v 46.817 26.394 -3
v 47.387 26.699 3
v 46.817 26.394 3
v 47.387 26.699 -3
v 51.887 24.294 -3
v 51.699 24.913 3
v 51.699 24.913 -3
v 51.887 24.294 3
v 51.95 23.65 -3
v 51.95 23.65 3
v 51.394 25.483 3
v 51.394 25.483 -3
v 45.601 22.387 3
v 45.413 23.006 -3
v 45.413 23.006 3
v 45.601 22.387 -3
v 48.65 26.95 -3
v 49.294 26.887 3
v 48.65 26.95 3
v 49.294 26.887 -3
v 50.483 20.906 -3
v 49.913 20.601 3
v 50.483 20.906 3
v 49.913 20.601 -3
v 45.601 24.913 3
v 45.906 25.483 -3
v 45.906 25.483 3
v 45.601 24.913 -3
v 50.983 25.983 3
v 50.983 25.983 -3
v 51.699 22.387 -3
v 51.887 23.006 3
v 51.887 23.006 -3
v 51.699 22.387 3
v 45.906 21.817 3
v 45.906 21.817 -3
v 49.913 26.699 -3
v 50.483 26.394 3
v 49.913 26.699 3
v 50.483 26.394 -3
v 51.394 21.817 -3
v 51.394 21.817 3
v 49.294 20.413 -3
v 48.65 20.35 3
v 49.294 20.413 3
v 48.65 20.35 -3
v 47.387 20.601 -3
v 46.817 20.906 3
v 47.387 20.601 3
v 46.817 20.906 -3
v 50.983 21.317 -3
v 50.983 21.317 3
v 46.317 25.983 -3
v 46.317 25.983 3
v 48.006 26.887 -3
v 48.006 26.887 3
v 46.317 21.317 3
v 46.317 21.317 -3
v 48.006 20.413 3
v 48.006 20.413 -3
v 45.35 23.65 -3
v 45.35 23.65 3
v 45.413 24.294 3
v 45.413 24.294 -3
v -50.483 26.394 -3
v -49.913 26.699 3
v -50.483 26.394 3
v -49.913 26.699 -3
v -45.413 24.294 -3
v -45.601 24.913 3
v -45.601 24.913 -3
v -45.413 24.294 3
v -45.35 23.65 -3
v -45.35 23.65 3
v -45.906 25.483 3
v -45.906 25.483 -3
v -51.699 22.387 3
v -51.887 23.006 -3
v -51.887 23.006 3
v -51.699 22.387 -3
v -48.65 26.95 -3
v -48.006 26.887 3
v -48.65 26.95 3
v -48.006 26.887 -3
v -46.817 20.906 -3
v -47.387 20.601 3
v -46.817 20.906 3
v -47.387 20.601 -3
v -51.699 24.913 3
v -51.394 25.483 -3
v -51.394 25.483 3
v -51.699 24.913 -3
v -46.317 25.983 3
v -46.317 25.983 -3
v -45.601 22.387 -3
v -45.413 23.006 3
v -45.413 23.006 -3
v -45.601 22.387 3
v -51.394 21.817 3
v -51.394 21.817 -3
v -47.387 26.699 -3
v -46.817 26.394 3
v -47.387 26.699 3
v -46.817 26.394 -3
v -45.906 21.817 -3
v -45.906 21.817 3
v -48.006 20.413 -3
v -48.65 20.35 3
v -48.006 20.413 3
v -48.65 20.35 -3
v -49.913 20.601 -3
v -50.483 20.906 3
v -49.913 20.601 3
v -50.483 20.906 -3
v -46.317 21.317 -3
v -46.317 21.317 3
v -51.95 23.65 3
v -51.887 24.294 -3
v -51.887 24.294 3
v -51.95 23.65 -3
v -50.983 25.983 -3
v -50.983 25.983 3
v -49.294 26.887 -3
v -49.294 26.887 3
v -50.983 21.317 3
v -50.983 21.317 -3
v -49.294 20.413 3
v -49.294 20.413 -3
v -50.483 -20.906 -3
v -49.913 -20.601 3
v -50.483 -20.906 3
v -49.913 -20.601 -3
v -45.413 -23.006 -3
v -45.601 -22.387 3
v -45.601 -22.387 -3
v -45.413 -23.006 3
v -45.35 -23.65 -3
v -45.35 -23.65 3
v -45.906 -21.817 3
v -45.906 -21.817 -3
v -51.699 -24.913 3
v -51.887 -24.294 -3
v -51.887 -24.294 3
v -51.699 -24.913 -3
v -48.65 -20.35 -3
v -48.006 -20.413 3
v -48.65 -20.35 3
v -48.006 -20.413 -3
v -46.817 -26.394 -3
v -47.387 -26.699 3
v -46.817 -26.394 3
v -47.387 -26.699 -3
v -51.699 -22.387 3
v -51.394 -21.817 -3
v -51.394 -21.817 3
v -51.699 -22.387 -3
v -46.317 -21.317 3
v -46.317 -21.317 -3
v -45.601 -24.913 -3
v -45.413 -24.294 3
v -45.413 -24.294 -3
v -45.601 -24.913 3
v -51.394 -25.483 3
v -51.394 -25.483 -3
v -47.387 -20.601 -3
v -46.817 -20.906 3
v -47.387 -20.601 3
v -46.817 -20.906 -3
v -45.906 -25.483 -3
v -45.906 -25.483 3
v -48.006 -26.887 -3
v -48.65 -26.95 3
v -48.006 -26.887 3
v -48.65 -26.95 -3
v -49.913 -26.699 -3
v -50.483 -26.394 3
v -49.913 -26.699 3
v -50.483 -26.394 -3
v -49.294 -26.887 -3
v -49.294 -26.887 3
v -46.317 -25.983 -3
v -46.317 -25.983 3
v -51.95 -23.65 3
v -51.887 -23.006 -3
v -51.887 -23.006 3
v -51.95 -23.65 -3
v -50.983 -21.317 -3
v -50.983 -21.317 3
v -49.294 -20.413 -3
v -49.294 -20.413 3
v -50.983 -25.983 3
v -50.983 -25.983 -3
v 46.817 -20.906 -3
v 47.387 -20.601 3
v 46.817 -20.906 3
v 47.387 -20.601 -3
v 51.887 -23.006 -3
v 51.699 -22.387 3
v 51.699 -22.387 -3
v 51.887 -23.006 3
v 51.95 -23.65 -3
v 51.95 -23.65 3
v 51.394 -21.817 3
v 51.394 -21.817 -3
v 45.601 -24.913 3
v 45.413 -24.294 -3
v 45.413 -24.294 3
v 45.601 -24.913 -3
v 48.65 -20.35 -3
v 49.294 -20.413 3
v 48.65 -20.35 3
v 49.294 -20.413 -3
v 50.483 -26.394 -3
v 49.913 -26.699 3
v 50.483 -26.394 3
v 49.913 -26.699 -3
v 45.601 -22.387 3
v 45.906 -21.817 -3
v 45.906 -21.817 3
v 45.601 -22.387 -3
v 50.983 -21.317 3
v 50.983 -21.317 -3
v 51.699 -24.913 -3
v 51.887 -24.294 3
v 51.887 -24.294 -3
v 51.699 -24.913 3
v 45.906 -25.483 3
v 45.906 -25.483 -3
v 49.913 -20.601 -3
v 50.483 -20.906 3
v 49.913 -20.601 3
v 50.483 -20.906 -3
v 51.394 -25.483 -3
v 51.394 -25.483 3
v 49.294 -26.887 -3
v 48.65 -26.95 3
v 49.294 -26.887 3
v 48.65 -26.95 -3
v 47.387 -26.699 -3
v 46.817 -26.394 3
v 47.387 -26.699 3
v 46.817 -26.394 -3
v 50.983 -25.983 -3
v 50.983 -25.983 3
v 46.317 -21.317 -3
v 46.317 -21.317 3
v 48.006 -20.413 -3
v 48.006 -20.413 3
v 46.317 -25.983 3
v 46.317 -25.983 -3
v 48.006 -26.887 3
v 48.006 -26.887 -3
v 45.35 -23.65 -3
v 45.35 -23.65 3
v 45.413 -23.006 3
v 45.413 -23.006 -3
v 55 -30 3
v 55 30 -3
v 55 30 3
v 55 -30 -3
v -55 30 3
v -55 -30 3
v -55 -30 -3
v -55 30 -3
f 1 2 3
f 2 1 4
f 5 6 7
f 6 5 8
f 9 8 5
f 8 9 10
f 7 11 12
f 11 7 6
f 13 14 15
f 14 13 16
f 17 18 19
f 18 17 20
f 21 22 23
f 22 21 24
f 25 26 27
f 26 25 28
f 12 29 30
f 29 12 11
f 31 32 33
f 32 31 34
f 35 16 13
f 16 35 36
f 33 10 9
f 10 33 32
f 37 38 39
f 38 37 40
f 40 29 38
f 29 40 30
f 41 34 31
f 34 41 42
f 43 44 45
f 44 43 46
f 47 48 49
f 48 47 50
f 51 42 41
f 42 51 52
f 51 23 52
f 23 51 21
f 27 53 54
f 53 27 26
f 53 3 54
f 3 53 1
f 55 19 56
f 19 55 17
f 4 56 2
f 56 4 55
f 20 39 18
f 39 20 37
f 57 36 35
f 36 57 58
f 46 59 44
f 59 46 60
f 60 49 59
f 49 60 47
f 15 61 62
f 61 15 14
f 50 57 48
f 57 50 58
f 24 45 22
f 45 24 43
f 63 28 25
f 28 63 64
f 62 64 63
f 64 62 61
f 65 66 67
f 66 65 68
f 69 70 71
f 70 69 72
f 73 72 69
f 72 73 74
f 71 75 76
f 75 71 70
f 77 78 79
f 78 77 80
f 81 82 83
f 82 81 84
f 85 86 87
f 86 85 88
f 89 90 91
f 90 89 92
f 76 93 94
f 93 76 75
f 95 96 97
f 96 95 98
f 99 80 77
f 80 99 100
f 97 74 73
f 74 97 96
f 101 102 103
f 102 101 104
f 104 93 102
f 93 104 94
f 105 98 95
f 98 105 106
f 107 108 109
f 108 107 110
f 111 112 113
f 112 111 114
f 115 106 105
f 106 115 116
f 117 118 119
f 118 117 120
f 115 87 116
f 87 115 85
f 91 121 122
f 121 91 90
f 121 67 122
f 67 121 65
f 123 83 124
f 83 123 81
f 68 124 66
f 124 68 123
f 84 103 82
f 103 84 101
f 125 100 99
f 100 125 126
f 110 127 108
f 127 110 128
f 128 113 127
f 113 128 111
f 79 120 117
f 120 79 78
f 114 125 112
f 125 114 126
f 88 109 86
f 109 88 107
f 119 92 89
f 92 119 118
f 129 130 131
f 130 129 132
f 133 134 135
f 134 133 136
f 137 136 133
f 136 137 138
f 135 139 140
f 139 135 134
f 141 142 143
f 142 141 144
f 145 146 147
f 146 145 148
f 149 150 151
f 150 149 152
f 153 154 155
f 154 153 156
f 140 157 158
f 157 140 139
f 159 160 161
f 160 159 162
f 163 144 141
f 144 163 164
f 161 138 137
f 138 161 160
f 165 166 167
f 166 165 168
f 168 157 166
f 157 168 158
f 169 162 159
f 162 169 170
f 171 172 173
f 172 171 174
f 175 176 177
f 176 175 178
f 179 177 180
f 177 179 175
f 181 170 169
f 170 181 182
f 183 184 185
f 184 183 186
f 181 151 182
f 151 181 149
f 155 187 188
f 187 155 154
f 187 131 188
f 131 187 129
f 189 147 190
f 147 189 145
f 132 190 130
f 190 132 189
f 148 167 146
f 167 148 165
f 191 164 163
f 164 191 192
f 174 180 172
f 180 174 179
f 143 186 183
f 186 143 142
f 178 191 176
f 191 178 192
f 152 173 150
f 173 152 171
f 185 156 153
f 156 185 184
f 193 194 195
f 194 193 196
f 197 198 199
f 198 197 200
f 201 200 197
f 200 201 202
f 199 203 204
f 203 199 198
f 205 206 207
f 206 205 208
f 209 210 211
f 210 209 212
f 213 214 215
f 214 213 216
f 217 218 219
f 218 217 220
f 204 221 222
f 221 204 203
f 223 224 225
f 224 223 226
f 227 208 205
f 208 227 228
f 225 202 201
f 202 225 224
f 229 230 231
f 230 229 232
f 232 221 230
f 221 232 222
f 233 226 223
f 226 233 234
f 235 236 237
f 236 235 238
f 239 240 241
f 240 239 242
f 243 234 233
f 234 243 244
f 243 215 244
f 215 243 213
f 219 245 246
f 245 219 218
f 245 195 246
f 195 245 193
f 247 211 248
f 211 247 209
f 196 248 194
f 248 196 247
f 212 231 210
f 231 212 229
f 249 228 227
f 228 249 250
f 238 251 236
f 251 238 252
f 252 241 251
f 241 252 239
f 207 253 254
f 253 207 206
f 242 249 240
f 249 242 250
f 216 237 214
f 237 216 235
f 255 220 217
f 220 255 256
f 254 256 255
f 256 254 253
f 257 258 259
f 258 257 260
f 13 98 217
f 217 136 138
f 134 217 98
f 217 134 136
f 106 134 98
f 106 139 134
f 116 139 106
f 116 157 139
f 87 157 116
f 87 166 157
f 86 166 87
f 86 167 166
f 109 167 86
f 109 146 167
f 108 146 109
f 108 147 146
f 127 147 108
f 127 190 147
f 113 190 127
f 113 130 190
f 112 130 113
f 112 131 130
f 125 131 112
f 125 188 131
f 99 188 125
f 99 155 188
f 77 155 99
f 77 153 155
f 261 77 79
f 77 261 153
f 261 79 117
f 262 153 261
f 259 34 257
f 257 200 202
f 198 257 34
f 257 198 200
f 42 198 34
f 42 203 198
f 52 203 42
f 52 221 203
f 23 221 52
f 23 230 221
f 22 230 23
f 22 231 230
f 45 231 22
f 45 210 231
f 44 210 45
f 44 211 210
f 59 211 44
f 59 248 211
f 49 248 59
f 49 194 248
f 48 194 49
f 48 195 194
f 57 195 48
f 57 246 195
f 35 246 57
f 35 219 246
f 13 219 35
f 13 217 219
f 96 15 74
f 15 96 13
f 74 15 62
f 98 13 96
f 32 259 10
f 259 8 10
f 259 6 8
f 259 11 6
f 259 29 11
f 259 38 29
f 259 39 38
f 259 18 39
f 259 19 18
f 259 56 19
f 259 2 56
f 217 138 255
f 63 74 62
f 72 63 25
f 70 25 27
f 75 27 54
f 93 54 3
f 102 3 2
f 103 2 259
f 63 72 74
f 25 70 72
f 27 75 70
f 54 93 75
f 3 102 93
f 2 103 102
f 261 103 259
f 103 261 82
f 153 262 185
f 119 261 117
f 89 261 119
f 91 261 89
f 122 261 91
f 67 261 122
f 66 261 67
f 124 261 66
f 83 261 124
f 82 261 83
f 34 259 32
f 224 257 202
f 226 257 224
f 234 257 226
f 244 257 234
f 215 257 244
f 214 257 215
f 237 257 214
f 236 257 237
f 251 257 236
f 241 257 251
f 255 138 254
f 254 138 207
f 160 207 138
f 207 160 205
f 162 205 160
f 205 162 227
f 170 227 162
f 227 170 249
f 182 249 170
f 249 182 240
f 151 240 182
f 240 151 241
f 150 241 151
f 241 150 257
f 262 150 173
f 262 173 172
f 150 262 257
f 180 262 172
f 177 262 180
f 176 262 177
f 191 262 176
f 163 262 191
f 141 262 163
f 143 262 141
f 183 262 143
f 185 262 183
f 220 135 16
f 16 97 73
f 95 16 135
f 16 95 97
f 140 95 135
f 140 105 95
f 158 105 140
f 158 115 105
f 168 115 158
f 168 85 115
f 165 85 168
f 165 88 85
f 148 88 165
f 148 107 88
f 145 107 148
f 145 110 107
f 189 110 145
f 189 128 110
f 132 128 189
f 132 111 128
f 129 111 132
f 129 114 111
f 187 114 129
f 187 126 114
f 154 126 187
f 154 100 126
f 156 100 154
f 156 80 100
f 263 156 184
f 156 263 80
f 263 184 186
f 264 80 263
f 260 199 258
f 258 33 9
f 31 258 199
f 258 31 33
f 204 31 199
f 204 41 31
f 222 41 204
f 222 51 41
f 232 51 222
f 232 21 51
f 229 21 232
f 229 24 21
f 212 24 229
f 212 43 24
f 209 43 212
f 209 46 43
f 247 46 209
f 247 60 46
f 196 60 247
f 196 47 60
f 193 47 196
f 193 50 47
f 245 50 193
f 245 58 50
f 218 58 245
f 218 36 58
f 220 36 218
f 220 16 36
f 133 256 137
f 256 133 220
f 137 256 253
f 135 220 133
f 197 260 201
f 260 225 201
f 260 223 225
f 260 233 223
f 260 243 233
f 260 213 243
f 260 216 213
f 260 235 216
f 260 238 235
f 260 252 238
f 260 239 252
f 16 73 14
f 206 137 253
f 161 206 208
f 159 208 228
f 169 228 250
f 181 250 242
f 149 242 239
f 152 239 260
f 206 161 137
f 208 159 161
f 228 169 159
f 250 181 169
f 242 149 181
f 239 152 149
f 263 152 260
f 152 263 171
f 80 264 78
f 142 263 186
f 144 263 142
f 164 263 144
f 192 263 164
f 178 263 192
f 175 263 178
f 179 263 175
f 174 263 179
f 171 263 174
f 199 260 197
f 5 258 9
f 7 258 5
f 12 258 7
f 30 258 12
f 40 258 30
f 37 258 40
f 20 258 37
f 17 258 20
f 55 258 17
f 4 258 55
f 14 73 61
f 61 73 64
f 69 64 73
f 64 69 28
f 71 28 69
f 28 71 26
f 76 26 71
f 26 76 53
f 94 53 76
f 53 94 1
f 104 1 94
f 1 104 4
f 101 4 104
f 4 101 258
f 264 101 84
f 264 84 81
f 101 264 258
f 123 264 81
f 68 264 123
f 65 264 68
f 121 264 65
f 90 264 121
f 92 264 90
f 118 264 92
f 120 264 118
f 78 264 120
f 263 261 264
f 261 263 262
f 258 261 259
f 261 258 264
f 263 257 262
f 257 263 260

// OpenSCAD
$fn = 32;

// ----------------------------------------------------------------------
// Corner plate 110 x 60 x 6
// 4 holes, centres taken from the edge offset
// ----------------------------------------------------------------------

// --- parameters (mm) ---
plate = [110, 60, 6];  // overall size (x, y, z)
holes = 4;             // number of holes the drawing asks for
hole_d = 6.6;          // hole diameter
edge = 6.35;           // hole centre offset from the plate edge

// --- derived feature positions (mm) ---
corner_x = plate[0] / 2 - edge;  // = 48.65   corner hole X
corner_y = plate[1] / 2 - edge;  // = 23.65   corner hole Y
feature_centers = [
  [corner_x, corner_y],
  [-corner_x, corner_y],
  [-corner_x, -corner_y],
  [corner_x, -corner_y]
];   // hole centres the loop below drills

// plate outline, every hole drilled through with the same cutters
difference() {
  cube(plate, center = true);
  for (centre = feature_centers)
    translate([centre[0], centre[1], 0])
      cylinder(d = hole_d, h = plate[2] + 2, center = true);
}
